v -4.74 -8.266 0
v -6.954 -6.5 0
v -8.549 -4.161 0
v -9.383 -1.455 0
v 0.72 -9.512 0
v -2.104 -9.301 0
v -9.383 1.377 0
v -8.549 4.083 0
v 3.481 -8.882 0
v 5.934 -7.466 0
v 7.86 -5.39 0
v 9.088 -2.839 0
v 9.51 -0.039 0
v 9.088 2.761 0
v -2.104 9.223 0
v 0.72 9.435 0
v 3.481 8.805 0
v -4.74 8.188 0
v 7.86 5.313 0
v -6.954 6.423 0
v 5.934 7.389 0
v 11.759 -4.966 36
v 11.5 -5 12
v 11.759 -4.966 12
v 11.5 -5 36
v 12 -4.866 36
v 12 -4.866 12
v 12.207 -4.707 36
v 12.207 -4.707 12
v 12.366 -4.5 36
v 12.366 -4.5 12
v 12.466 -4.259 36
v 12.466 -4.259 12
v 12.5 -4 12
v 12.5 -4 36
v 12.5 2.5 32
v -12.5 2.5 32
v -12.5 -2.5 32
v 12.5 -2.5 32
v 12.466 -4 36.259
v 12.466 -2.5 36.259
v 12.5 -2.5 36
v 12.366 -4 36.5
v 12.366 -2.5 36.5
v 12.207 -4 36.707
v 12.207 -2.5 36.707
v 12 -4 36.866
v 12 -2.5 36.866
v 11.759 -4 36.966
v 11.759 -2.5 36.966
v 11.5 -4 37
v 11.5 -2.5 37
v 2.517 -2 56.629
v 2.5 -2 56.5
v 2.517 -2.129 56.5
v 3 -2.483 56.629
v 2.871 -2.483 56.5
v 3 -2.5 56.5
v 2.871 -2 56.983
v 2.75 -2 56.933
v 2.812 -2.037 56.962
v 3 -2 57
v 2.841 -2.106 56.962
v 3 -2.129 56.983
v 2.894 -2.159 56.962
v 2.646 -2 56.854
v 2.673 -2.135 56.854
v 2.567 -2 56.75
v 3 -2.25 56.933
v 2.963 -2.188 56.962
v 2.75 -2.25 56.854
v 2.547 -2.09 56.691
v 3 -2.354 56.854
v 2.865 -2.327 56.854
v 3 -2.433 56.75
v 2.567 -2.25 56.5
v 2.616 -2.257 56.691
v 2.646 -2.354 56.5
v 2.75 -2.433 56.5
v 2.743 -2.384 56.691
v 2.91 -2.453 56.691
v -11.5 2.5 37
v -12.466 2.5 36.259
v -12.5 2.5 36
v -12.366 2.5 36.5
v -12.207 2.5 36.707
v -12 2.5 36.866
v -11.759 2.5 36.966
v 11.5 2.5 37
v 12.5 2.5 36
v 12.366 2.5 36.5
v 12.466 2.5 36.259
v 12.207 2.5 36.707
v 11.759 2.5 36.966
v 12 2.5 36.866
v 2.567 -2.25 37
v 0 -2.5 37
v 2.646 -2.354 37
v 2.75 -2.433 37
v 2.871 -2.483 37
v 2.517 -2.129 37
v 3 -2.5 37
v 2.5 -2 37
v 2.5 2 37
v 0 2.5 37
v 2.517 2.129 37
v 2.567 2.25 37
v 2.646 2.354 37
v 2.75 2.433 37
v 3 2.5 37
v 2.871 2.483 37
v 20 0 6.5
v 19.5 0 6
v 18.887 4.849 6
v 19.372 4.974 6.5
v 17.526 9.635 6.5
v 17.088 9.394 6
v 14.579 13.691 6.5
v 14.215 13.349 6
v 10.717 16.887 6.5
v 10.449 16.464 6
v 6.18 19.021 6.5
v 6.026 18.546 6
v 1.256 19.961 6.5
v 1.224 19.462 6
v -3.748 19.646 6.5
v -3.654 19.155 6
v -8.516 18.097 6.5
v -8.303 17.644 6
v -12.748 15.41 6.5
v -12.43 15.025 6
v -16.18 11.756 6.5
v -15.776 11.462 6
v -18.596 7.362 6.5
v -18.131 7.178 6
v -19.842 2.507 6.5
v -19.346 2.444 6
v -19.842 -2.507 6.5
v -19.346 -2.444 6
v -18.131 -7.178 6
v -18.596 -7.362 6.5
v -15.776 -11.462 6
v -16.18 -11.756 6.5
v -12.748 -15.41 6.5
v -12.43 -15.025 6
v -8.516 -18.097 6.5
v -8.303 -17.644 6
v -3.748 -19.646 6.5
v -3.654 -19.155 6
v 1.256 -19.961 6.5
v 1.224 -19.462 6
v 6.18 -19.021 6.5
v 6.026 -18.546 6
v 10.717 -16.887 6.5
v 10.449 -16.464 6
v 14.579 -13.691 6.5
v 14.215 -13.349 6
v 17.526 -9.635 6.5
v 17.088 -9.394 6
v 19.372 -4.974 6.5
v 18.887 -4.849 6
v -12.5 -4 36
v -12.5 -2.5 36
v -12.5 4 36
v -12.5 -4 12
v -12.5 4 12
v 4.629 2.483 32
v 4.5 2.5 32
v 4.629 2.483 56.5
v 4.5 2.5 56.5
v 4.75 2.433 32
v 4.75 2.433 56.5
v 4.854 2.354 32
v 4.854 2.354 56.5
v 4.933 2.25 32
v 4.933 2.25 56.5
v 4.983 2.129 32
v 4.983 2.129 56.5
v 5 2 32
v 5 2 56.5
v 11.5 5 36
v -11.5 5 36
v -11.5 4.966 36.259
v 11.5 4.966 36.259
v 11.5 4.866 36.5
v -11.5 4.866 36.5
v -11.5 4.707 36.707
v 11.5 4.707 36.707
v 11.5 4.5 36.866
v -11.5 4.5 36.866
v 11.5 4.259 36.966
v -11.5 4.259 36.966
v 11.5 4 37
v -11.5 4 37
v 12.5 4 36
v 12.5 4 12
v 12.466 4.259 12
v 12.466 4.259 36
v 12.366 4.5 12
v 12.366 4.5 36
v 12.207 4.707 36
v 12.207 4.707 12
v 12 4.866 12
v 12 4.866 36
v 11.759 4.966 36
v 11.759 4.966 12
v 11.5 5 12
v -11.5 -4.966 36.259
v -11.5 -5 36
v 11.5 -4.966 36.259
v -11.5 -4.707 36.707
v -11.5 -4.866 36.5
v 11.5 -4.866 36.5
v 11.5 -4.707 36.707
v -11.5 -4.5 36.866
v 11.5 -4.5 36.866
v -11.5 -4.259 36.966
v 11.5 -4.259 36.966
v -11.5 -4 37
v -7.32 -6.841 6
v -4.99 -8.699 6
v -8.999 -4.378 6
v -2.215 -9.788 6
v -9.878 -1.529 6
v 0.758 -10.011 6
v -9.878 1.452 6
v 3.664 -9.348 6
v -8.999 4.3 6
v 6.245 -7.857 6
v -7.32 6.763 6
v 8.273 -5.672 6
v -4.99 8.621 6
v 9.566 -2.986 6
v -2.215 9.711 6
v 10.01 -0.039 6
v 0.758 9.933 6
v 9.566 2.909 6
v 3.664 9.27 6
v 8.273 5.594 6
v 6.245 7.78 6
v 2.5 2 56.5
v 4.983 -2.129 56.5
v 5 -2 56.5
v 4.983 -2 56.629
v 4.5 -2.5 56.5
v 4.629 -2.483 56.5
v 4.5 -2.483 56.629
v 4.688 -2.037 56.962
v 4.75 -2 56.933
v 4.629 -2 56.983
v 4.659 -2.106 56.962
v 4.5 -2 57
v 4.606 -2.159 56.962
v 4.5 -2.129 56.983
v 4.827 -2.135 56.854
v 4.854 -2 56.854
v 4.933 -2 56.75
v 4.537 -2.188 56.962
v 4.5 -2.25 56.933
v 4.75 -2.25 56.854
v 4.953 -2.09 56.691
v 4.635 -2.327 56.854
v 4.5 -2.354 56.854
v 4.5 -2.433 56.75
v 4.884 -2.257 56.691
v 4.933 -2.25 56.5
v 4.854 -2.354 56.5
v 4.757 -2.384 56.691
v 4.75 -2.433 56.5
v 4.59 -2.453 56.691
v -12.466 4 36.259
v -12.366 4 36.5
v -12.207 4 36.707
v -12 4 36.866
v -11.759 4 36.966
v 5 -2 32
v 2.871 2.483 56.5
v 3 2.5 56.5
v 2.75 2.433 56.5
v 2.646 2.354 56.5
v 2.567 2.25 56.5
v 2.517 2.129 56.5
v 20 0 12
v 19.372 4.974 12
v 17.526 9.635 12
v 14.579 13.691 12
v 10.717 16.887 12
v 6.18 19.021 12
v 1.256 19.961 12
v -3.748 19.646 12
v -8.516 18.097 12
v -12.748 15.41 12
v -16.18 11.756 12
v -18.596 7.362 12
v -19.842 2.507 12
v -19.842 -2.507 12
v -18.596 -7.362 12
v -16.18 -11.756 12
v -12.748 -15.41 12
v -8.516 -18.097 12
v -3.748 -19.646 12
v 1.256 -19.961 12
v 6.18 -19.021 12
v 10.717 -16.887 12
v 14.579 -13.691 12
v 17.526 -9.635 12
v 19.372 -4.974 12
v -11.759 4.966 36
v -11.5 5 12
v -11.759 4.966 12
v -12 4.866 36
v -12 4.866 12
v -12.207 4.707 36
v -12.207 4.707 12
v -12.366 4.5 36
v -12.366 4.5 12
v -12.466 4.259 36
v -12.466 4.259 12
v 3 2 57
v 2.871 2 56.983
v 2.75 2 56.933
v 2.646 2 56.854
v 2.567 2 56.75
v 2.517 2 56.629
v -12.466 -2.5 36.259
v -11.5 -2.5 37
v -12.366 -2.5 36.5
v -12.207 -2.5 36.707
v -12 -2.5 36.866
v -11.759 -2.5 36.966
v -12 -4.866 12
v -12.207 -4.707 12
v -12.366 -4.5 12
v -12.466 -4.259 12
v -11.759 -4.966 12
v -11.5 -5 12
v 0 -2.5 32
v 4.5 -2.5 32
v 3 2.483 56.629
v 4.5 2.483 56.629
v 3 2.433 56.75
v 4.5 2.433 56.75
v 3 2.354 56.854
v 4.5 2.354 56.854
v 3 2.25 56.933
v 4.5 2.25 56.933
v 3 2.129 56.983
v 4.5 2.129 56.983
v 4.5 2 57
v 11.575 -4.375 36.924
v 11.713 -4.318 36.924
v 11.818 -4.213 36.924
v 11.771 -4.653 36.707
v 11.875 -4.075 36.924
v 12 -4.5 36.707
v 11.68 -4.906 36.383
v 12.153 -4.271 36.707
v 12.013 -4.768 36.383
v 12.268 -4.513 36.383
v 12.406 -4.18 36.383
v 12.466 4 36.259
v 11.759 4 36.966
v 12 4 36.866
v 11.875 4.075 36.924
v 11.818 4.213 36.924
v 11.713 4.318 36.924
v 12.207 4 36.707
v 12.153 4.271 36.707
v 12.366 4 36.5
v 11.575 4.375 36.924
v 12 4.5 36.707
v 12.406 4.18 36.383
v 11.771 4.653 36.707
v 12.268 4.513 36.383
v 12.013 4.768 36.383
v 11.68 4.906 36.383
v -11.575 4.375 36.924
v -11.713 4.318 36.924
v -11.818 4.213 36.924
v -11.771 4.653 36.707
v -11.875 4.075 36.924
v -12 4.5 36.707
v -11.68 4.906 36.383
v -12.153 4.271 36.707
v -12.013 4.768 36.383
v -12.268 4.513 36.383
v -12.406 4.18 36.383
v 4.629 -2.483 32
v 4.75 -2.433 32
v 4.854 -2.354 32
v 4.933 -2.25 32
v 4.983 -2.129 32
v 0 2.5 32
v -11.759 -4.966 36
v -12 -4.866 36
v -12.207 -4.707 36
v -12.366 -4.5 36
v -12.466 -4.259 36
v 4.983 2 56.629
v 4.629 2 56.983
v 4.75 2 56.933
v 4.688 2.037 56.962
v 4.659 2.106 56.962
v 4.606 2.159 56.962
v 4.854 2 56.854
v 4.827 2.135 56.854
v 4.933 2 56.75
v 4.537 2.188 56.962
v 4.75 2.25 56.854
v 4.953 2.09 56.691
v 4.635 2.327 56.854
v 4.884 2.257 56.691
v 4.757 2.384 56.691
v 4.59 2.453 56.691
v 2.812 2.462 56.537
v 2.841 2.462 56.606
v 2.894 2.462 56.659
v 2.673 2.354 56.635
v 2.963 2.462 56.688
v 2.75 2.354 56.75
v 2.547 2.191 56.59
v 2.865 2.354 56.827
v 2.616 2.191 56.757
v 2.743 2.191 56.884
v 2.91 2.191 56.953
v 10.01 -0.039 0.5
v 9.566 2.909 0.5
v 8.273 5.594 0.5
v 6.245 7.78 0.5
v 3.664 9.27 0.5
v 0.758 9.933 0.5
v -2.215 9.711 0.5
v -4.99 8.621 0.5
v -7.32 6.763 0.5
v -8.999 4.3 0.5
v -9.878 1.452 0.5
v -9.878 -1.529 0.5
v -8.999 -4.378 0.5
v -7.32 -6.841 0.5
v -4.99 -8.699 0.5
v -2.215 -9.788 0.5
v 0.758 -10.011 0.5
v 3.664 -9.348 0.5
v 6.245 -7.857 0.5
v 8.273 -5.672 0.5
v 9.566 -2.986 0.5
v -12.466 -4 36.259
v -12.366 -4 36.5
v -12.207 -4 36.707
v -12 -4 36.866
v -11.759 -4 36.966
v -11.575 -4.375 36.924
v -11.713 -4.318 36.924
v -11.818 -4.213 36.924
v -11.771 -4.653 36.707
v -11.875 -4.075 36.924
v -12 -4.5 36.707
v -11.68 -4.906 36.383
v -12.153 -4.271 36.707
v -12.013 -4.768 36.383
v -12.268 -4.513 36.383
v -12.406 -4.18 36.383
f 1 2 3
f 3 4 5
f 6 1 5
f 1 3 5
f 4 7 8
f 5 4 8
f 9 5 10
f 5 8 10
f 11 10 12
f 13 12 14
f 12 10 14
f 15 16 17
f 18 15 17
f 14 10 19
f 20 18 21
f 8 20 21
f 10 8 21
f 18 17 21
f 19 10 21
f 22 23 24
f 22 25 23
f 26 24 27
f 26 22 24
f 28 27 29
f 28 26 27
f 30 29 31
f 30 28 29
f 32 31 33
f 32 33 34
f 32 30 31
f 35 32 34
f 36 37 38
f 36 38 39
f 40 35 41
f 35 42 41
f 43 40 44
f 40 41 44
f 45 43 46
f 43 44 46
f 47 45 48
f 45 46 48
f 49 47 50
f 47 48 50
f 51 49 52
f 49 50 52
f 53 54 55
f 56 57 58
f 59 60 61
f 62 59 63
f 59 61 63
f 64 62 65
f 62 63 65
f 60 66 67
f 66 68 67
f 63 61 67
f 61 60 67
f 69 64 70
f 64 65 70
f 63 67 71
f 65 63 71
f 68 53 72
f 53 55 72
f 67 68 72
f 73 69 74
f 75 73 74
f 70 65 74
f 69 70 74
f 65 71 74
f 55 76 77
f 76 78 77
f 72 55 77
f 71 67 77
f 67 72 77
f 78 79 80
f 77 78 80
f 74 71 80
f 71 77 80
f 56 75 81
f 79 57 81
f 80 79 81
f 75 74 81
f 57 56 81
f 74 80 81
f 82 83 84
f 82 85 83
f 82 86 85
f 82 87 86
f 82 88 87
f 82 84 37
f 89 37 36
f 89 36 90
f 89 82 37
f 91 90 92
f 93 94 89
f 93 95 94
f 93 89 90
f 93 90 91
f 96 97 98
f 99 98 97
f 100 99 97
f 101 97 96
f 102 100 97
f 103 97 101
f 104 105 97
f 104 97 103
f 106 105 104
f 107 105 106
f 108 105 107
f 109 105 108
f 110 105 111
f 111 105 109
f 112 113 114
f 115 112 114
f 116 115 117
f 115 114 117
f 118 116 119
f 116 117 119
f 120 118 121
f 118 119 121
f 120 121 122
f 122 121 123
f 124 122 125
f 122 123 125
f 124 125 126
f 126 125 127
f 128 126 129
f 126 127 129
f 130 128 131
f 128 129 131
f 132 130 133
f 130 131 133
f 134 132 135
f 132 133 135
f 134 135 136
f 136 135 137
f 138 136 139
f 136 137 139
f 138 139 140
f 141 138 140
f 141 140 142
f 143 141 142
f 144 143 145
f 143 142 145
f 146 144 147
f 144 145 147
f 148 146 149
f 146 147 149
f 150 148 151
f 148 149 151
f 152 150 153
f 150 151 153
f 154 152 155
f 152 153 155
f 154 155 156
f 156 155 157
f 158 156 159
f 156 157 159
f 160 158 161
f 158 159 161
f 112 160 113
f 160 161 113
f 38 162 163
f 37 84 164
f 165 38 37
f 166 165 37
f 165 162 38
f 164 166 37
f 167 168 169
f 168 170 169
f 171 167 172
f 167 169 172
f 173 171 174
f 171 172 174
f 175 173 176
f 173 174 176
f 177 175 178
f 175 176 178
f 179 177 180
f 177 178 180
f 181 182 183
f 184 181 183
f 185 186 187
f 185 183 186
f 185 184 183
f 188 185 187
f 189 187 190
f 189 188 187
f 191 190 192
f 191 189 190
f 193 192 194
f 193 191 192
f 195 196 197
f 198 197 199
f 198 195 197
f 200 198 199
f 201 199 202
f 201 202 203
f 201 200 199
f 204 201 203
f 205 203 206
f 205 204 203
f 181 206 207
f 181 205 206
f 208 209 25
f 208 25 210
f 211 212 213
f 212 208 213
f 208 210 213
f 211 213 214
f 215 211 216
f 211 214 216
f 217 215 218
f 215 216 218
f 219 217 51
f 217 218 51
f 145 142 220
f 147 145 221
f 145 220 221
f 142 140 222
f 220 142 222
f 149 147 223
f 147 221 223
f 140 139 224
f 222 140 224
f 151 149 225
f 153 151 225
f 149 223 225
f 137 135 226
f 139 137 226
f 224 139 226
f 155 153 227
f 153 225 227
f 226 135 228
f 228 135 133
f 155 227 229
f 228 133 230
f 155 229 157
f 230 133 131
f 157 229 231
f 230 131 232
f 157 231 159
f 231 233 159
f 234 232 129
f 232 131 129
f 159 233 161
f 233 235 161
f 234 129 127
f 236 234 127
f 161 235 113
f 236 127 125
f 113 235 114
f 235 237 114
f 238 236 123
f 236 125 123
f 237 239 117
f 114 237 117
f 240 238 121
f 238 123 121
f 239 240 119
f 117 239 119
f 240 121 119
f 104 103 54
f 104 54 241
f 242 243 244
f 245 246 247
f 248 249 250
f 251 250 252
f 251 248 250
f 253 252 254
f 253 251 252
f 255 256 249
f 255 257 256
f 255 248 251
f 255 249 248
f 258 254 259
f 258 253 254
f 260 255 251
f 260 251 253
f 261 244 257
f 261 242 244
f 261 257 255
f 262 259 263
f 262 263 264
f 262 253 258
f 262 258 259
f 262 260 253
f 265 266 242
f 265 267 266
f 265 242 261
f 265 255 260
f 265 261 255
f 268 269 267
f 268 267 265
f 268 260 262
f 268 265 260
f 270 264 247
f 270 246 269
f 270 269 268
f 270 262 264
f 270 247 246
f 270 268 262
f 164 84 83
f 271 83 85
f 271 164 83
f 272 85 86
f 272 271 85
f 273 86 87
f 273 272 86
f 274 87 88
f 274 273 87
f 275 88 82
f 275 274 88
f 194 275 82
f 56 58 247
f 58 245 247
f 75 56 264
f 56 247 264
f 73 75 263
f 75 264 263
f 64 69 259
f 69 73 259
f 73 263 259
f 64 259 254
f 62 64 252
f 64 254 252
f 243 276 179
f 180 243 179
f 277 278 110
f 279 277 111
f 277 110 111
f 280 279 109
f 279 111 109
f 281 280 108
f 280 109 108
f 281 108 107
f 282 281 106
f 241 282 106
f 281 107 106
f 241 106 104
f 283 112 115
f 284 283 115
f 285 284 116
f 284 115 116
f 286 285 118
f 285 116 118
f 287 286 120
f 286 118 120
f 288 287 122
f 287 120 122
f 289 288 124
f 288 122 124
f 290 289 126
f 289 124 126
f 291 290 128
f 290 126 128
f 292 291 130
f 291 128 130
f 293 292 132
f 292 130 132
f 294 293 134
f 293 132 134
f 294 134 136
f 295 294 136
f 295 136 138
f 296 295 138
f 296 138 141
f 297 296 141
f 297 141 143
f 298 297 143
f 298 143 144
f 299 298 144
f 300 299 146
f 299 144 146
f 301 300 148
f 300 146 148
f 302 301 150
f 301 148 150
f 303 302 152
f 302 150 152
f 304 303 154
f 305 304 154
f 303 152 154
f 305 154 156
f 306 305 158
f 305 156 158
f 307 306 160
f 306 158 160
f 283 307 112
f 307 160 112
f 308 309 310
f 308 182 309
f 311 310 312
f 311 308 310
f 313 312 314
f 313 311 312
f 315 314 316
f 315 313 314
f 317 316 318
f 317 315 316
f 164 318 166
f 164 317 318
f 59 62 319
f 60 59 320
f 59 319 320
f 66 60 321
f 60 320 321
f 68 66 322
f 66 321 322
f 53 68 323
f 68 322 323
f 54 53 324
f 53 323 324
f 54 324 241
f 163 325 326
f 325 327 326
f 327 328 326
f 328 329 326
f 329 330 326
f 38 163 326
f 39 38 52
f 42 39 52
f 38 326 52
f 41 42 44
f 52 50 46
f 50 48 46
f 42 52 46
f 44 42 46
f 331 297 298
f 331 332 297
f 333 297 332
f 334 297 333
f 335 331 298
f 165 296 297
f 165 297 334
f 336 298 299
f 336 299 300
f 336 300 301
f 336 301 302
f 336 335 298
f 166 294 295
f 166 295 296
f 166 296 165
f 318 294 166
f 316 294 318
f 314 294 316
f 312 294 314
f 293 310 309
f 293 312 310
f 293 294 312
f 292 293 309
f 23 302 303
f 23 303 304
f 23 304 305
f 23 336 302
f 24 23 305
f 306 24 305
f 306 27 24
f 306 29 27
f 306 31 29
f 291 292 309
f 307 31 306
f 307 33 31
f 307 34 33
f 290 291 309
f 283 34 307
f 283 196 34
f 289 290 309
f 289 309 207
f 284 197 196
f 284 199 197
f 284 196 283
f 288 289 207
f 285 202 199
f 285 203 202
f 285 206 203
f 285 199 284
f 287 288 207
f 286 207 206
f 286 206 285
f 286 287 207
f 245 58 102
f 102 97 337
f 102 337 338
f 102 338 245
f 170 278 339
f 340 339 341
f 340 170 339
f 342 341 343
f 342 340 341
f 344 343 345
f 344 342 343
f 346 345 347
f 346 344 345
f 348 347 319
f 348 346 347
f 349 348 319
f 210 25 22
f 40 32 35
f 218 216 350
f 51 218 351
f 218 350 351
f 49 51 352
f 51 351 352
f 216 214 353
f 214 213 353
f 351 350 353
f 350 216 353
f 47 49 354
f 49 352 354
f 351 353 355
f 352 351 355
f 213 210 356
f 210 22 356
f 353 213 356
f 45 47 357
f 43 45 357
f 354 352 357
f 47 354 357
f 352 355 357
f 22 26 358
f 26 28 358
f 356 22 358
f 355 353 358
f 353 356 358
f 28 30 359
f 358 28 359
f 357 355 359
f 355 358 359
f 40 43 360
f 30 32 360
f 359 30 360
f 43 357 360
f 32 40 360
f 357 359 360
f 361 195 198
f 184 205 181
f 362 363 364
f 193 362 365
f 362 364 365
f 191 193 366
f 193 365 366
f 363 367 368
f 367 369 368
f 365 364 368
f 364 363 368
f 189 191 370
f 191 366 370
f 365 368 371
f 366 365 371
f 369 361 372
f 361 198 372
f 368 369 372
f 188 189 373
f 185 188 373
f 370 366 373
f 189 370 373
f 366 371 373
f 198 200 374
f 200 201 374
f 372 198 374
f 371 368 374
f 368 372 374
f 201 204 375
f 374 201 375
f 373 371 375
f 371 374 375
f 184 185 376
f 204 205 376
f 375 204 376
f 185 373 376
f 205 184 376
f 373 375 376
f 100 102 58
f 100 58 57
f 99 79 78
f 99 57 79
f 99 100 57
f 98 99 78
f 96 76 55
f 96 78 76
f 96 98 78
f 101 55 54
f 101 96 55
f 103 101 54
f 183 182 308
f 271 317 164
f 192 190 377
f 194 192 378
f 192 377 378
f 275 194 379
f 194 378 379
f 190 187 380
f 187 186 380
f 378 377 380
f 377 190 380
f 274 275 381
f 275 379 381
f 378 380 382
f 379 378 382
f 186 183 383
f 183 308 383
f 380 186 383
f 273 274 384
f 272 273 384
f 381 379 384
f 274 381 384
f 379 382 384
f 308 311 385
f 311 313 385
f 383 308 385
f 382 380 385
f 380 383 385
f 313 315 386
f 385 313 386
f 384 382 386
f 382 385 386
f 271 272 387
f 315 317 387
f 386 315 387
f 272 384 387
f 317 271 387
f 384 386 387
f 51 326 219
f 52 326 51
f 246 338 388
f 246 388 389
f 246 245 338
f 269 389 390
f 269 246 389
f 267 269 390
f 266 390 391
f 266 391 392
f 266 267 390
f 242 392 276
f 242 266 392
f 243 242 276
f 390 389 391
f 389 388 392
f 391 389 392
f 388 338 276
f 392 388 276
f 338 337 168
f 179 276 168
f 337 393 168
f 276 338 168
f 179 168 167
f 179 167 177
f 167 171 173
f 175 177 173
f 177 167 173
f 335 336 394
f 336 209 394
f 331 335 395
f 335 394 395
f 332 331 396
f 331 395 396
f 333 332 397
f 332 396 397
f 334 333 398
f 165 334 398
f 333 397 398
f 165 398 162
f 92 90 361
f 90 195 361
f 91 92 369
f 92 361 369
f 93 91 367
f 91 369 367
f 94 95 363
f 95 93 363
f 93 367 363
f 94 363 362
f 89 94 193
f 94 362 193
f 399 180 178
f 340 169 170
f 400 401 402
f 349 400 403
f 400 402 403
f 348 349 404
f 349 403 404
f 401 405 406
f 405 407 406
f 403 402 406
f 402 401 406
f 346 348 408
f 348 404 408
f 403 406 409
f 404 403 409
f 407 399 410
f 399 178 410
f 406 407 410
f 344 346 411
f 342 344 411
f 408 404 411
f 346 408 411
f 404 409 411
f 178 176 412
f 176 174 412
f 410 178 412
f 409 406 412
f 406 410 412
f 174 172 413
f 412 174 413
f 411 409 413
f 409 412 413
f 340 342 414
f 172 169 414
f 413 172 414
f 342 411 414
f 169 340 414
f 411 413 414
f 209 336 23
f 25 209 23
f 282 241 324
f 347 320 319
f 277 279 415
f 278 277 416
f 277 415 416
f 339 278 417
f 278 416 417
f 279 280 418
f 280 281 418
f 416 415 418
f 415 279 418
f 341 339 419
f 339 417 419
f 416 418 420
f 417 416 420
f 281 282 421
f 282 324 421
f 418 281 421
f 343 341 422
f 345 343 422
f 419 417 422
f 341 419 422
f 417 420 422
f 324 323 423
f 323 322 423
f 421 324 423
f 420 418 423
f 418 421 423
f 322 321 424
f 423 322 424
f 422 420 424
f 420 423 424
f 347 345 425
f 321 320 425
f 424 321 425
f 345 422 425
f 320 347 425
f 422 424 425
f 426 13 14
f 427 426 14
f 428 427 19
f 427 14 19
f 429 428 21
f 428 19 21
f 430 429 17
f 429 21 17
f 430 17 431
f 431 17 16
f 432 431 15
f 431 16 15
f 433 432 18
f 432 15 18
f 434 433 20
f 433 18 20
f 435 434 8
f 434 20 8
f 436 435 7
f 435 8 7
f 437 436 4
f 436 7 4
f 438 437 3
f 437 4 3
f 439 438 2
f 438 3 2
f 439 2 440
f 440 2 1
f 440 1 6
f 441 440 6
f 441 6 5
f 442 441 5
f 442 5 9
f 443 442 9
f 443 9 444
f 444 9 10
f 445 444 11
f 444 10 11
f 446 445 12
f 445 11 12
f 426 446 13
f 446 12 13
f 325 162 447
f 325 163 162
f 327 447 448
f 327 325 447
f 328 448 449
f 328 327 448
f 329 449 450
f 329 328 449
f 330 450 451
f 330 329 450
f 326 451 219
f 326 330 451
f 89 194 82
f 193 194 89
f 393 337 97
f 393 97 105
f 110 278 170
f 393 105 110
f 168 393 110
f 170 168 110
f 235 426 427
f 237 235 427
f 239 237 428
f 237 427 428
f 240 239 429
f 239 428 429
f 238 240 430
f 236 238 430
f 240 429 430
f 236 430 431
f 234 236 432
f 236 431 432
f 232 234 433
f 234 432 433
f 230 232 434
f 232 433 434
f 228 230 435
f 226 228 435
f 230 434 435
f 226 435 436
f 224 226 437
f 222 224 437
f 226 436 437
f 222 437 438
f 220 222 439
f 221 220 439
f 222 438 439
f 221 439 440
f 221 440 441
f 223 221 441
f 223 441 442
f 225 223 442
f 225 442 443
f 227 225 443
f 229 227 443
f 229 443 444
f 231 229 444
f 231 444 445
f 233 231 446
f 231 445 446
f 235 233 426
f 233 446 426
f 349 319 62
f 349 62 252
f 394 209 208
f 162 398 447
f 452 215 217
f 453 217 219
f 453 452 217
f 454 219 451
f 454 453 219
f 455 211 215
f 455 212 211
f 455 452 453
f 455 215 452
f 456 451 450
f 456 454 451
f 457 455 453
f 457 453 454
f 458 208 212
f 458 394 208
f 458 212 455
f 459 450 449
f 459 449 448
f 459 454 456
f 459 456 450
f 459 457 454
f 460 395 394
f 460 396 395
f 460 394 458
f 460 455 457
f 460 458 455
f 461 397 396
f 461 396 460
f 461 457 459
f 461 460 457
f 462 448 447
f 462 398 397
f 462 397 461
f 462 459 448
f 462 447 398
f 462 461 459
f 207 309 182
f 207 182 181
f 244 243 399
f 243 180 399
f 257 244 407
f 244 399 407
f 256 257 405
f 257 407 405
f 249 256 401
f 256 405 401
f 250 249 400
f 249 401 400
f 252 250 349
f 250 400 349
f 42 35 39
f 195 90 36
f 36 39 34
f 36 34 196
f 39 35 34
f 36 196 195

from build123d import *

# Parameters (mm, degrees)
SKETCH_R        = 10
PAD_DEPTH       = 6
CHAMFER_SIZE    = 0.5
SKETCH001_R     = 20
PAD001_DEPTH    = 6
CHAMFER001_SIZE = 0.5
SKETCH002_W     = 25
SKETCH002_H     = 10
PAD002_DEPTH    = 25
FILLET_R        = 1
SKETCH003_W     = 25
SKETCH003_H     = 5
POCKET_DEPTH    = 5
SKETCH004_W     = 5
SKETCH004_H     = 5
PAD003_DEPTH    = 25
SKETCH005_W     = 2.5
SKETCH005_H     = 5
POCKET001_DEPTH = 20
FILLET001_R     = 0.5


with BuildPart() as body:
    # Sketch → Pad (new body)
    with BuildSketch(Plane.XY):
        with Locations((0.010393, -0.038773)):
            Circle(SKETCH_R)
    extrude(amount=PAD_DEPTH)

    # Chamfer
    chamfer_edges = [body.edges().sort_by_distance(p)[0] for p in [
        (-9.989607, -0.038773, 0),
    ]]
    chamfer(chamfer_edges, length=CHAMFER_SIZE)

    # Sketch001 (on Face3 of Chamfer) → Pad001 (join)
    with BuildSketch(Plane.XY.offset(6)):
        Circle(SKETCH001_R)
    extrude(amount=PAD001_DEPTH)

    # Chamfer001
    chamfer001_edges = [body.edges().sort_by_distance(p)[0] for p in [
        (-20, 0, 6),
    ]]
    chamfer(chamfer001_edges, length=CHAMFER001_SIZE)

    # Sketch002 (on Face3 of Chamfer001) → Pad002 (join)
    with BuildSketch(Plane.XY.offset(12)):
        Rectangle(SKETCH002_W, SKETCH002_H)
    extrude(amount=PAD002_DEPTH)

    # Fillet
    fillet_edges = [body.edges().sort_by_distance(p)[0] for p in [
        (-12.5, -5, 24.5),
        (-12.5, 5, 24.5),
        (12.5, -5, 24.5),
        (12.5, 5, 24.5),
        (0, -5, 37),
        (12.5, 0, 37),
        (0, 5, 37),
        (-12.5, 0, 37),
    ]]
    fillet(fillet_edges, radius=FILLET_R)

    # Sketch003 (on Face20 of Fillet) → Pocket (cut)
    with BuildSketch(Plane.XY.offset(37)):
        Rectangle(SKETCH003_W, SKETCH003_H)
    extrude(amount=-POCKET_DEPTH, mode=Mode.SUBTRACT)


with BuildPart() as finger:
    # Sketch004 (on Face1 of CopyPocket) → Pad003 (new body)
    with BuildSketch(Plane.XY.offset(32)):
        with Locations((2.5, 0)):
            Rectangle(SKETCH004_W, SKETCH004_H)
    extrude(amount=PAD003_DEPTH)

    # Sketch005 (on Face6 of Pad003) → Pocket001 (cut)
    with BuildSketch(Plane.XY.offset(57)):
        with Locations((1.25, 0)):
            Rectangle(SKETCH005_W, SKETCH005_H)
    extrude(amount=-POCKET001_DEPTH, mode=Mode.SUBTRACT)

    # Fillet001
    fillet001_edges = [finger.edges().sort_by_distance(p)[0] for p in [
        (2.5, -2.5, 47),
        (2.5, 0, 57),
        (2.5, 2.5, 47),
        (5, -2.5, 44.5),
        (5, 2.5, 44.5),
        (5, 0, 57),
        (3.75, -2.5, 57),
        (3.75, 2.5, 57),
    ]]
    fillet(fillet001_edges, radius=FILLET001_R)


solid = Compound([body.part, finger.part])
